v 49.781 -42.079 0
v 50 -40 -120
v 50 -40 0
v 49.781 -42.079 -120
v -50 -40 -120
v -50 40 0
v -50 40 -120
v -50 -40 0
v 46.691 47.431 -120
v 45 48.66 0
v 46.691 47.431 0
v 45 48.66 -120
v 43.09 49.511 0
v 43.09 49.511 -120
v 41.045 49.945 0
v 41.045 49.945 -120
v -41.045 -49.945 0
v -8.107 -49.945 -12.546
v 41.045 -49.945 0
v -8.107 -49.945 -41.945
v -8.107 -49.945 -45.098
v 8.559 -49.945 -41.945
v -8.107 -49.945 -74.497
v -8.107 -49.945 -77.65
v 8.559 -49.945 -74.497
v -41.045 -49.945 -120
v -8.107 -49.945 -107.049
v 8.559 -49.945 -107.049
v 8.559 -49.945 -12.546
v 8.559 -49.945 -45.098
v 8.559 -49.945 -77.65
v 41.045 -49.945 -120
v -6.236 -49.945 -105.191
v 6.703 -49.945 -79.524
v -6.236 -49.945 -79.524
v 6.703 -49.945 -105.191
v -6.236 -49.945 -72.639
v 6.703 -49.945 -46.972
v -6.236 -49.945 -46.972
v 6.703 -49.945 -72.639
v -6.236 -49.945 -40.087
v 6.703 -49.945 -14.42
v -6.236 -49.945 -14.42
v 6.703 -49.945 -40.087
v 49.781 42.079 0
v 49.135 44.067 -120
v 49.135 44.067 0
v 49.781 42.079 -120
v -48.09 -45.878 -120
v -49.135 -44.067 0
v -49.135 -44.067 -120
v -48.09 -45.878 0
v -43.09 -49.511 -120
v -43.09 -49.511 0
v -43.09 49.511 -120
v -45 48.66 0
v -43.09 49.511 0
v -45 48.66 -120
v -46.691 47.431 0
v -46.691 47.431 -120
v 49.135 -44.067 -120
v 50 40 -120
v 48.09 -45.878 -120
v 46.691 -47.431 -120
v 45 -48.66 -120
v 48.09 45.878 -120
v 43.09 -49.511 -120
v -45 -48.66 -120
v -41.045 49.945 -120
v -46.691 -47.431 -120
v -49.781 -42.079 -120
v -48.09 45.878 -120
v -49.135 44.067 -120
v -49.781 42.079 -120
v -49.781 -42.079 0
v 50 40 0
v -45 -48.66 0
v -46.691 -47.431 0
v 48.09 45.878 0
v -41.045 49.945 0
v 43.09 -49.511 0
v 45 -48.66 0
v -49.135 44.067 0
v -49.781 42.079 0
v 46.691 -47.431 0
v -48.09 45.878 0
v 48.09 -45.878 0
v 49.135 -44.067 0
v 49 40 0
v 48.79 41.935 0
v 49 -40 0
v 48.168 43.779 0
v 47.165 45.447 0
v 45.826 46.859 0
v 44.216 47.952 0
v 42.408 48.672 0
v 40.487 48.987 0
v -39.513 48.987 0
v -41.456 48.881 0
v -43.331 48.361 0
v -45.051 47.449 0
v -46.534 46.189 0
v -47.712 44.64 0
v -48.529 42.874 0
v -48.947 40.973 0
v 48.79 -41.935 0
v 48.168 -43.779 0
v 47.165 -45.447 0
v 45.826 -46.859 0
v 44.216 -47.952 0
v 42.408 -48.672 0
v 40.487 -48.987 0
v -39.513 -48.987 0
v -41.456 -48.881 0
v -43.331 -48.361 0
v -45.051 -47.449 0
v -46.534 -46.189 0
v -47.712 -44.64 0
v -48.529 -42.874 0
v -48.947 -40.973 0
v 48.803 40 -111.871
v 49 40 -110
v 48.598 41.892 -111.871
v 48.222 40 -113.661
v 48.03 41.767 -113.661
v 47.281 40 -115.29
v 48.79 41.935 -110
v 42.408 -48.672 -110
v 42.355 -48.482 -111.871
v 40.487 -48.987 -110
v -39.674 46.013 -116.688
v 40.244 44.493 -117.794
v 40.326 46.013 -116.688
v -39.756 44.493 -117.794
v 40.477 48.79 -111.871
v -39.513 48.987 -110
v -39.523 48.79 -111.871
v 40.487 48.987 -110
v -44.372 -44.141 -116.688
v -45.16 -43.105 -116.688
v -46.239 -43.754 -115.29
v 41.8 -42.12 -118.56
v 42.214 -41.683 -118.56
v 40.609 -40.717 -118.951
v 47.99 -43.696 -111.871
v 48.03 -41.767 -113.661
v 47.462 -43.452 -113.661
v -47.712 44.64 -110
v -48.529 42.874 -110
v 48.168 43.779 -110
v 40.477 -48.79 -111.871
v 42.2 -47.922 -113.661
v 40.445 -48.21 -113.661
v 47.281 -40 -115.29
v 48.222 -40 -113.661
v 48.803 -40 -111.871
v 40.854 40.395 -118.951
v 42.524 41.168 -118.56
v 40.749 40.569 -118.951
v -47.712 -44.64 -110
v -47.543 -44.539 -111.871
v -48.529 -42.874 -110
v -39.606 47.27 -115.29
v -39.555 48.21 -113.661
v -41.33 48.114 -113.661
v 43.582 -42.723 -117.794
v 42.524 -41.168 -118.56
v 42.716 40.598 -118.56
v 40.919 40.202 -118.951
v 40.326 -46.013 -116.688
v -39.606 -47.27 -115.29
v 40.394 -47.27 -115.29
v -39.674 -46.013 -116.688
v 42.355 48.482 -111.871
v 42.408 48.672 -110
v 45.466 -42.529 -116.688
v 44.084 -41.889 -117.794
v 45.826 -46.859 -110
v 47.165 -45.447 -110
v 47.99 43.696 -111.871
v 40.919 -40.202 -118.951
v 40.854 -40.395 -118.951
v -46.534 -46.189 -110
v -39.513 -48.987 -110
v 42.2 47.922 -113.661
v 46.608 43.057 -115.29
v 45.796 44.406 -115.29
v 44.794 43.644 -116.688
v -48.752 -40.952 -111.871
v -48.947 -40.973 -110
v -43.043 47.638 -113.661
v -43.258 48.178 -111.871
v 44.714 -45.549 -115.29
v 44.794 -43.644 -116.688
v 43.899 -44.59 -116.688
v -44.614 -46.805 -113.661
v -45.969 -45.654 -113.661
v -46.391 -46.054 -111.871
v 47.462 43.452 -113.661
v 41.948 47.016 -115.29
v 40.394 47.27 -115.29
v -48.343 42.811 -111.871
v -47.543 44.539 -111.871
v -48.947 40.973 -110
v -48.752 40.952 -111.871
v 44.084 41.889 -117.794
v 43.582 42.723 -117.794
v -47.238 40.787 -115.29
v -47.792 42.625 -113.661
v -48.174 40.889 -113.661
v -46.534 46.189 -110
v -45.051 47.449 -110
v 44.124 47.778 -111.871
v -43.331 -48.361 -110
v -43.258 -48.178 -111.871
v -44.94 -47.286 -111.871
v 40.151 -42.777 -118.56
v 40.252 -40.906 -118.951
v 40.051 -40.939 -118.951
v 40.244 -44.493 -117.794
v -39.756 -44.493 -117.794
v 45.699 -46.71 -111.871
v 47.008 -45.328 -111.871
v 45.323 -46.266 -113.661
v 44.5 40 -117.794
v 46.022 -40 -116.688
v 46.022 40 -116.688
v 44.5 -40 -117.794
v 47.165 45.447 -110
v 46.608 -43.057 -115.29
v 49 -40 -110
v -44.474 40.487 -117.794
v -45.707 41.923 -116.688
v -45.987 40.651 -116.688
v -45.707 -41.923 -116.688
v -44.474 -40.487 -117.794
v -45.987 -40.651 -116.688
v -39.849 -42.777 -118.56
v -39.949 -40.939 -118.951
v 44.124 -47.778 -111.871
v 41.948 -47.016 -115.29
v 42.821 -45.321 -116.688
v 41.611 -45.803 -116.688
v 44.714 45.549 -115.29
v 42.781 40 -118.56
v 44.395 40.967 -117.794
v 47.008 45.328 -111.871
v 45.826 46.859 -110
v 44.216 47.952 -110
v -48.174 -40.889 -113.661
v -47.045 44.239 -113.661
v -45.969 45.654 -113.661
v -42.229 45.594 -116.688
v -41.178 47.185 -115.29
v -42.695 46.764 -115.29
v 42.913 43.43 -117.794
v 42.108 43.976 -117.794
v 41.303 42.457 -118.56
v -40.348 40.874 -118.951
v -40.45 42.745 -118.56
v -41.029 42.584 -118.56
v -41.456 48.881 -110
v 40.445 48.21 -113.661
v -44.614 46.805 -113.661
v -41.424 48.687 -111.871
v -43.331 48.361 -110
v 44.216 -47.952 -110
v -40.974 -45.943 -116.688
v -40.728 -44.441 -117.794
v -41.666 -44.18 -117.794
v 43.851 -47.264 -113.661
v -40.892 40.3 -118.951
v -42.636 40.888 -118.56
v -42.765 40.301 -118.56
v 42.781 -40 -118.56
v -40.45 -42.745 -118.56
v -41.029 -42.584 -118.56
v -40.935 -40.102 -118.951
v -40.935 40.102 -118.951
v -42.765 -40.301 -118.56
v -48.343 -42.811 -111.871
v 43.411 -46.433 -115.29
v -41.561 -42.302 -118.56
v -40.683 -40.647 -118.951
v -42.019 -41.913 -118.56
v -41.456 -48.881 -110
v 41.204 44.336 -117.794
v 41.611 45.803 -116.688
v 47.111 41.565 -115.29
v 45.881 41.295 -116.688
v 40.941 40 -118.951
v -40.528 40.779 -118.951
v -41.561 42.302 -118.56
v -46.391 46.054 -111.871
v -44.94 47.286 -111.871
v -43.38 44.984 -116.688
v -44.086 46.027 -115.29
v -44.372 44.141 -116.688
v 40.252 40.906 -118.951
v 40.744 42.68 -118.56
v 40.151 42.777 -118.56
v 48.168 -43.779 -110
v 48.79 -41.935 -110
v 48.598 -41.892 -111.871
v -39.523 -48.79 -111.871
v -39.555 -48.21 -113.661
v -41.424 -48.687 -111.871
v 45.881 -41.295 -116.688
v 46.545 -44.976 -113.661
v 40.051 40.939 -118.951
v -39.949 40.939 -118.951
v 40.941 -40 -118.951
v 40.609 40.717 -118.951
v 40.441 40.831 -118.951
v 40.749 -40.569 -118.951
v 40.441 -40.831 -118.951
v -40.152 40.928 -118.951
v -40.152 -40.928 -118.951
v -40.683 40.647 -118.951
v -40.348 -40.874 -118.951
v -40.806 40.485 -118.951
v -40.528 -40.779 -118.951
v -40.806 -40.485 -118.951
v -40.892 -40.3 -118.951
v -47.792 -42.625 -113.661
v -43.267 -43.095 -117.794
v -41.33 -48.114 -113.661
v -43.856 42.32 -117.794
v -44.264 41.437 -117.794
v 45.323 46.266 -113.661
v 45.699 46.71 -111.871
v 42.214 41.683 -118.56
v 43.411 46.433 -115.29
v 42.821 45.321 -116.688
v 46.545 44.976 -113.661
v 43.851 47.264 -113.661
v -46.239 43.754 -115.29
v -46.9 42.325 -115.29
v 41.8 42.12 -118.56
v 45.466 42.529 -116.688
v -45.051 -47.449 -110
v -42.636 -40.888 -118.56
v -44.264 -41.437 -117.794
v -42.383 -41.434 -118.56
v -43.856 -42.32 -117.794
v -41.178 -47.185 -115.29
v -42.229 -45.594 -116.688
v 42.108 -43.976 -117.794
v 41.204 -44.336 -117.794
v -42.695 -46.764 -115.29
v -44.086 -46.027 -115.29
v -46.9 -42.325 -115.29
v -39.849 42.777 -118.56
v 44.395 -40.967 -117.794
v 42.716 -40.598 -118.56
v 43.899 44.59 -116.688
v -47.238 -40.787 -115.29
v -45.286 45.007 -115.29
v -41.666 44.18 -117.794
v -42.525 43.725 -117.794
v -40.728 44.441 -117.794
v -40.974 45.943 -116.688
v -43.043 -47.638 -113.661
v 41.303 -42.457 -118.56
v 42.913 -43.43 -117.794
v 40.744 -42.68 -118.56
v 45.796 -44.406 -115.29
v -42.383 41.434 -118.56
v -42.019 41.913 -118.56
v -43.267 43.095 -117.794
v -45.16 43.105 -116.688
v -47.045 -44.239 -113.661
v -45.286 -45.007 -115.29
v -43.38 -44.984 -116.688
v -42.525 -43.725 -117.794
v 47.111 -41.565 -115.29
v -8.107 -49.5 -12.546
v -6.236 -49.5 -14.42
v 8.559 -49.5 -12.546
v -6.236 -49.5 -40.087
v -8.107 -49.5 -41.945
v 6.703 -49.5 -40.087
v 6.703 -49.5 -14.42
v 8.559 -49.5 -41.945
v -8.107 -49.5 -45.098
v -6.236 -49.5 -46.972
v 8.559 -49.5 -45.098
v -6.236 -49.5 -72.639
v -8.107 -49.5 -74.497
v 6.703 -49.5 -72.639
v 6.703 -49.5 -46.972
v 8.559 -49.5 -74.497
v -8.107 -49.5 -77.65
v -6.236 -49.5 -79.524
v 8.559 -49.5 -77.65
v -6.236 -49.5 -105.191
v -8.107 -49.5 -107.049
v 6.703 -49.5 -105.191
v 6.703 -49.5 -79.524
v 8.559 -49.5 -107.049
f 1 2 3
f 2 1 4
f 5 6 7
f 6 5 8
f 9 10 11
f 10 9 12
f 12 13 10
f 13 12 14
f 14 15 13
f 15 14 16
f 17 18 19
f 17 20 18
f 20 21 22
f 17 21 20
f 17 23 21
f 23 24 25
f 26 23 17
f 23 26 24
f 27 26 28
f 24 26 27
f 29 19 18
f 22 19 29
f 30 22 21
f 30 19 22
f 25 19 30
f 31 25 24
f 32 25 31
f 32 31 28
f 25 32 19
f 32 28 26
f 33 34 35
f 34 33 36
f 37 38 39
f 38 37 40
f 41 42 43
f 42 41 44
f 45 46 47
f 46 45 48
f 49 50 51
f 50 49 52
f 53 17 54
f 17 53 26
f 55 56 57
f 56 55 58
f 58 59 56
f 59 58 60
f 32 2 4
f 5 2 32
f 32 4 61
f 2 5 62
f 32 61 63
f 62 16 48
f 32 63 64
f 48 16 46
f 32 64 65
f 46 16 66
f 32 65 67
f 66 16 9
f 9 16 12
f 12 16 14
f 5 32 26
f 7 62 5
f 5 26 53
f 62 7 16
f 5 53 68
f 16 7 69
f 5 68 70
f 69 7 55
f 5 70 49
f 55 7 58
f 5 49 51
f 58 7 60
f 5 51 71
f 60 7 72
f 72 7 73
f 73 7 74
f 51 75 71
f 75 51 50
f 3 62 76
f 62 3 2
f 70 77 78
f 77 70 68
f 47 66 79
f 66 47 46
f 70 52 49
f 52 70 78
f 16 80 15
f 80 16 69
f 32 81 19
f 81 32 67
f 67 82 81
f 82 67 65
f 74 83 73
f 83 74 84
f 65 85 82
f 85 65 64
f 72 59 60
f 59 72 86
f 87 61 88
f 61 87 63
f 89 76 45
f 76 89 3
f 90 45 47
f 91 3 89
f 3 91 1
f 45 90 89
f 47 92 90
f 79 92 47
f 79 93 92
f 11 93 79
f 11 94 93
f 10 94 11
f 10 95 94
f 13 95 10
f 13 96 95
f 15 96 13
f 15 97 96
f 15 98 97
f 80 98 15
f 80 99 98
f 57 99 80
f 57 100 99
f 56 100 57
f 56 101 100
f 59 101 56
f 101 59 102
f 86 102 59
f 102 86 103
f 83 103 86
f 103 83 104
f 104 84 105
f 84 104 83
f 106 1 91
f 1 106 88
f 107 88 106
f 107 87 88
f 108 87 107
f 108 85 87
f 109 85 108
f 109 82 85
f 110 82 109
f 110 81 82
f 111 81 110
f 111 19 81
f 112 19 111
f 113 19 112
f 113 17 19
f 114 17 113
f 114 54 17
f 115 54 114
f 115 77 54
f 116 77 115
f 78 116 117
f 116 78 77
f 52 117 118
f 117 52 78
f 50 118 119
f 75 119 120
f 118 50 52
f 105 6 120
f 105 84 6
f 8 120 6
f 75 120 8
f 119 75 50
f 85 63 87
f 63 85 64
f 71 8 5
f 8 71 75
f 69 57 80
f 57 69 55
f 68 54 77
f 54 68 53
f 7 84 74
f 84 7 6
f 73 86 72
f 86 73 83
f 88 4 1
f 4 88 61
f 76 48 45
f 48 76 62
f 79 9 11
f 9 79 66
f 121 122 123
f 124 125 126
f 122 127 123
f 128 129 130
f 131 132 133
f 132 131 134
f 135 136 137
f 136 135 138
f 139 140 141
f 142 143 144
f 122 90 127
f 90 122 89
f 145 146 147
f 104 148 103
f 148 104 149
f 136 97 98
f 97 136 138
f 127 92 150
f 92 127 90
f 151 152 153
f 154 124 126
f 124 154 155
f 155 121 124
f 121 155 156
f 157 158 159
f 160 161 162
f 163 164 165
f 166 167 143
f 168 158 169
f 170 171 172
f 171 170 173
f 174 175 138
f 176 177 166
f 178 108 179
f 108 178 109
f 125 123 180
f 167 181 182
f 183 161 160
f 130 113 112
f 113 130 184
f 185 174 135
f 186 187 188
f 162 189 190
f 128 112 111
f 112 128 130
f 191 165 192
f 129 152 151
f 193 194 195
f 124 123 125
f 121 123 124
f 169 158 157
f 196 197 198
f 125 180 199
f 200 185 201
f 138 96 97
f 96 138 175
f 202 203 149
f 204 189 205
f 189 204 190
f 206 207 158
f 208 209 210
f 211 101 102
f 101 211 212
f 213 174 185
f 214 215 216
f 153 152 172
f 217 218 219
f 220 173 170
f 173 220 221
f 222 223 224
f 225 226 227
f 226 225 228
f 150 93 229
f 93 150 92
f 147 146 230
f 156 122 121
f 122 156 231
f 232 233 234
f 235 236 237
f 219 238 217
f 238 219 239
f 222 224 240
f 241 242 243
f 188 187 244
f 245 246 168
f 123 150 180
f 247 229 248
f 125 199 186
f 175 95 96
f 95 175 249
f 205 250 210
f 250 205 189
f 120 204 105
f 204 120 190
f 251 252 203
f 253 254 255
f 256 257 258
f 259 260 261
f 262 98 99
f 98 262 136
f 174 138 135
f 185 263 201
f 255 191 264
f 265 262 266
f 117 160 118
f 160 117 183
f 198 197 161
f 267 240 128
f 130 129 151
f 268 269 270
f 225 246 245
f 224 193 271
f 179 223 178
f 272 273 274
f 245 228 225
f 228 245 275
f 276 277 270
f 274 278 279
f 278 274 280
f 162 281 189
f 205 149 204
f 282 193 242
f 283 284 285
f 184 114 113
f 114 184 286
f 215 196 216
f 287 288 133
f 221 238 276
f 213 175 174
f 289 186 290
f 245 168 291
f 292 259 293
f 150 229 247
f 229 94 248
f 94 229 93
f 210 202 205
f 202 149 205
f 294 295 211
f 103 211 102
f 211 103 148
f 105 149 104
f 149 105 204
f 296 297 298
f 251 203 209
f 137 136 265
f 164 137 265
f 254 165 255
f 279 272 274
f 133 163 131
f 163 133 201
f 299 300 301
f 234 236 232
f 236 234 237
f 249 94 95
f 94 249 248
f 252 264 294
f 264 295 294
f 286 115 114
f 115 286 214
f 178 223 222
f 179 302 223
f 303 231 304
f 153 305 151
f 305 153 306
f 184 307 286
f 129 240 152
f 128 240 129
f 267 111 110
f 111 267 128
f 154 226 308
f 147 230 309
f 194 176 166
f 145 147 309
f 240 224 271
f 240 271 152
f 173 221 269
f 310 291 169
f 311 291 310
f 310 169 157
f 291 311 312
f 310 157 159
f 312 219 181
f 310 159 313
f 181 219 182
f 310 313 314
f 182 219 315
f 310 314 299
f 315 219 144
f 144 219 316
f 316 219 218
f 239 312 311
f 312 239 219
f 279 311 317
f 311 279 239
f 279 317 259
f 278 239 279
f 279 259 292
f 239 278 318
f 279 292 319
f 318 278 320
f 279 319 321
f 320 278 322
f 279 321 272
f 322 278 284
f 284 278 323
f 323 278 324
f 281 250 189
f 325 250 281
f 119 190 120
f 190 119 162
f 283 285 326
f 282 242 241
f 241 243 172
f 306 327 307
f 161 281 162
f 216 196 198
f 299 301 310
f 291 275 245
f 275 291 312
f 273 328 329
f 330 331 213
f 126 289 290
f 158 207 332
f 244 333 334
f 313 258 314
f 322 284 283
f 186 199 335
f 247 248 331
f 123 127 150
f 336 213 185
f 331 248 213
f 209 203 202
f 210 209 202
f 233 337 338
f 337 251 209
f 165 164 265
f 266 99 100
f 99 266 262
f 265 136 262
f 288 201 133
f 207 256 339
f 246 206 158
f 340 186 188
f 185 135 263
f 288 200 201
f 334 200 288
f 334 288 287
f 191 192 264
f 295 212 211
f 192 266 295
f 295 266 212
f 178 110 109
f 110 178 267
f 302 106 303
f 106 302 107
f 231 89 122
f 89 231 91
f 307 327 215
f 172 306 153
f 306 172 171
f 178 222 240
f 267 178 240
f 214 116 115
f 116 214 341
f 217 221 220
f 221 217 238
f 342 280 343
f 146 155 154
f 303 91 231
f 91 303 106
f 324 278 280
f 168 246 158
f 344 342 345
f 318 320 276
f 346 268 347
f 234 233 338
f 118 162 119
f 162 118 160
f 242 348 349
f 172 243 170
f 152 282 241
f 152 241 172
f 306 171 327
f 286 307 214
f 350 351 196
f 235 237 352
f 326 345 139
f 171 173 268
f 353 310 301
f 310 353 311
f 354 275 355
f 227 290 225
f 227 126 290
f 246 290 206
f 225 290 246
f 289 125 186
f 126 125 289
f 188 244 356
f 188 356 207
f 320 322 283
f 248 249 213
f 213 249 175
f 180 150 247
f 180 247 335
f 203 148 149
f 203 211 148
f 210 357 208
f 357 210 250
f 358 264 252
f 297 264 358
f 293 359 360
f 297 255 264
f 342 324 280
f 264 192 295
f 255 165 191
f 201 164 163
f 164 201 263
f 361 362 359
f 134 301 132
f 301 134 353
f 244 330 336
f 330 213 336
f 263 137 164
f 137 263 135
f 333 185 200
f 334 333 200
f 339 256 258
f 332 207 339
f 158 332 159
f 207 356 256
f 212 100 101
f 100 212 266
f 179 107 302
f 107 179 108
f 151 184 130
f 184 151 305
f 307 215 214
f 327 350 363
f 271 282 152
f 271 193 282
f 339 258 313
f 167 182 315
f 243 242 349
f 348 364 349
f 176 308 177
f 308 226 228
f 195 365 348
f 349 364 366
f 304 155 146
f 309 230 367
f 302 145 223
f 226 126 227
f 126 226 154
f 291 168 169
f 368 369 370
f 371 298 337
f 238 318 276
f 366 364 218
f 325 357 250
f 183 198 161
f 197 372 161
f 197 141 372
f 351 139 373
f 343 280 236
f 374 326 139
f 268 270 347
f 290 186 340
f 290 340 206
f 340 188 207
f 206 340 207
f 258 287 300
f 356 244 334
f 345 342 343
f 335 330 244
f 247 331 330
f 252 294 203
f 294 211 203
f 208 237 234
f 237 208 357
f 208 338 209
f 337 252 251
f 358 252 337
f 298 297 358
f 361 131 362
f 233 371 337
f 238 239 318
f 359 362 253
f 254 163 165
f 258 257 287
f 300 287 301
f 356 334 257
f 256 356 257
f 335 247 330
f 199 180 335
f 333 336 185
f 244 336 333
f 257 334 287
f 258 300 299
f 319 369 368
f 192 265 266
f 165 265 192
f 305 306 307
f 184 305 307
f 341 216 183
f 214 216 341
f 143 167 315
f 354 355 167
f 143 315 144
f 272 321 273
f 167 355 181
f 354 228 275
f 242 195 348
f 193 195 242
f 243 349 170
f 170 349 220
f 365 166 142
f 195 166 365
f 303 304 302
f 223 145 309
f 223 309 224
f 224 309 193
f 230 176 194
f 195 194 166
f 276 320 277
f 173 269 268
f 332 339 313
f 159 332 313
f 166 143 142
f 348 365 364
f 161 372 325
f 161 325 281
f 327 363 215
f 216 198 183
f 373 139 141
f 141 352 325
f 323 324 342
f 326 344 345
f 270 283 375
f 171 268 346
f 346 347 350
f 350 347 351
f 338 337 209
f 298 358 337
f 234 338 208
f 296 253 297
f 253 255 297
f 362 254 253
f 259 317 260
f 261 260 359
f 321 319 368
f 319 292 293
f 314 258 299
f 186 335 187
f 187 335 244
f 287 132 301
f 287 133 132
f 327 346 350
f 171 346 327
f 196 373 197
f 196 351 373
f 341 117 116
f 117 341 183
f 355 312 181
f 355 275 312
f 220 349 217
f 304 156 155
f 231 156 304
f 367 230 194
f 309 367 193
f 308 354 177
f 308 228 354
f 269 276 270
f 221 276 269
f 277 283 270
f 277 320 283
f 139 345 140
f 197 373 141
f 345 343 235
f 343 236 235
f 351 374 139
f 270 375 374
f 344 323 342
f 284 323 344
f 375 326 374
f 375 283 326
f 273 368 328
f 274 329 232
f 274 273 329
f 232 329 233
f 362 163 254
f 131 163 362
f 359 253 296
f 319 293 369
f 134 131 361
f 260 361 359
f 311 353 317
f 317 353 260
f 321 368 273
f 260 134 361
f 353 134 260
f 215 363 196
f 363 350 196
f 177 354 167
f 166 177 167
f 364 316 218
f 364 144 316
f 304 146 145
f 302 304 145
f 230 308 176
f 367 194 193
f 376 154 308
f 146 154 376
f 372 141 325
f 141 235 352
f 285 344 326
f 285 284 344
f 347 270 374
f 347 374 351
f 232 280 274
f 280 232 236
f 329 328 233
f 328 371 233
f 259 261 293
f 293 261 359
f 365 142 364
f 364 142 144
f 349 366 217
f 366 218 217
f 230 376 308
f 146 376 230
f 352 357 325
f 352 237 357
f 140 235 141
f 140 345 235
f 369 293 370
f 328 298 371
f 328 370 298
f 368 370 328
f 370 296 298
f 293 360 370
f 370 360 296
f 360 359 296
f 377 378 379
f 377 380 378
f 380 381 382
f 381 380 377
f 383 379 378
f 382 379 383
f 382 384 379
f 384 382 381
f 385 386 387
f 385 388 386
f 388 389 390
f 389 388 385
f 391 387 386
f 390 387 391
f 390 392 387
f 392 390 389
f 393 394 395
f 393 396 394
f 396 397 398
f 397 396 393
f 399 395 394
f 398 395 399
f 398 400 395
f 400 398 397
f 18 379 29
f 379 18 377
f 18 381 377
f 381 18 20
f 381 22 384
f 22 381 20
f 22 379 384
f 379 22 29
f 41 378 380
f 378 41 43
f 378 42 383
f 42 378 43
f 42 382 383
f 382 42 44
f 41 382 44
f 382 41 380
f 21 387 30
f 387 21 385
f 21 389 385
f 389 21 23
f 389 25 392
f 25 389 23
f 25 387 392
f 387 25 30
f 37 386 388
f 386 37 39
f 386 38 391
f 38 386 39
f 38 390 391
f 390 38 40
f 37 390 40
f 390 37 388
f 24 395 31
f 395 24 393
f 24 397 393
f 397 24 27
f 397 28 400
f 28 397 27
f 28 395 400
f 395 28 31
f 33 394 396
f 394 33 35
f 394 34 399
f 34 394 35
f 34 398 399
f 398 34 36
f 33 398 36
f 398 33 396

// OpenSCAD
h=120;
w=100;
r=10;
b=1;
difference(){
scale([1,1,-1])linear_extrude(h)
minkowski(){
square([w-r*2,w-r*2],center=true);
circle(r);
}
minkowski(){
	cube([w-r*2,w-r*2,(h-r)*2],center=true);
	sphere(r-b);
}
translate([0,-(w-b)/2,-h/2])rotate([90,0,0])linear_extrude(b/2)text("護美箱",font="serif",direction="ttb",size=h/5,valign="center");
}
